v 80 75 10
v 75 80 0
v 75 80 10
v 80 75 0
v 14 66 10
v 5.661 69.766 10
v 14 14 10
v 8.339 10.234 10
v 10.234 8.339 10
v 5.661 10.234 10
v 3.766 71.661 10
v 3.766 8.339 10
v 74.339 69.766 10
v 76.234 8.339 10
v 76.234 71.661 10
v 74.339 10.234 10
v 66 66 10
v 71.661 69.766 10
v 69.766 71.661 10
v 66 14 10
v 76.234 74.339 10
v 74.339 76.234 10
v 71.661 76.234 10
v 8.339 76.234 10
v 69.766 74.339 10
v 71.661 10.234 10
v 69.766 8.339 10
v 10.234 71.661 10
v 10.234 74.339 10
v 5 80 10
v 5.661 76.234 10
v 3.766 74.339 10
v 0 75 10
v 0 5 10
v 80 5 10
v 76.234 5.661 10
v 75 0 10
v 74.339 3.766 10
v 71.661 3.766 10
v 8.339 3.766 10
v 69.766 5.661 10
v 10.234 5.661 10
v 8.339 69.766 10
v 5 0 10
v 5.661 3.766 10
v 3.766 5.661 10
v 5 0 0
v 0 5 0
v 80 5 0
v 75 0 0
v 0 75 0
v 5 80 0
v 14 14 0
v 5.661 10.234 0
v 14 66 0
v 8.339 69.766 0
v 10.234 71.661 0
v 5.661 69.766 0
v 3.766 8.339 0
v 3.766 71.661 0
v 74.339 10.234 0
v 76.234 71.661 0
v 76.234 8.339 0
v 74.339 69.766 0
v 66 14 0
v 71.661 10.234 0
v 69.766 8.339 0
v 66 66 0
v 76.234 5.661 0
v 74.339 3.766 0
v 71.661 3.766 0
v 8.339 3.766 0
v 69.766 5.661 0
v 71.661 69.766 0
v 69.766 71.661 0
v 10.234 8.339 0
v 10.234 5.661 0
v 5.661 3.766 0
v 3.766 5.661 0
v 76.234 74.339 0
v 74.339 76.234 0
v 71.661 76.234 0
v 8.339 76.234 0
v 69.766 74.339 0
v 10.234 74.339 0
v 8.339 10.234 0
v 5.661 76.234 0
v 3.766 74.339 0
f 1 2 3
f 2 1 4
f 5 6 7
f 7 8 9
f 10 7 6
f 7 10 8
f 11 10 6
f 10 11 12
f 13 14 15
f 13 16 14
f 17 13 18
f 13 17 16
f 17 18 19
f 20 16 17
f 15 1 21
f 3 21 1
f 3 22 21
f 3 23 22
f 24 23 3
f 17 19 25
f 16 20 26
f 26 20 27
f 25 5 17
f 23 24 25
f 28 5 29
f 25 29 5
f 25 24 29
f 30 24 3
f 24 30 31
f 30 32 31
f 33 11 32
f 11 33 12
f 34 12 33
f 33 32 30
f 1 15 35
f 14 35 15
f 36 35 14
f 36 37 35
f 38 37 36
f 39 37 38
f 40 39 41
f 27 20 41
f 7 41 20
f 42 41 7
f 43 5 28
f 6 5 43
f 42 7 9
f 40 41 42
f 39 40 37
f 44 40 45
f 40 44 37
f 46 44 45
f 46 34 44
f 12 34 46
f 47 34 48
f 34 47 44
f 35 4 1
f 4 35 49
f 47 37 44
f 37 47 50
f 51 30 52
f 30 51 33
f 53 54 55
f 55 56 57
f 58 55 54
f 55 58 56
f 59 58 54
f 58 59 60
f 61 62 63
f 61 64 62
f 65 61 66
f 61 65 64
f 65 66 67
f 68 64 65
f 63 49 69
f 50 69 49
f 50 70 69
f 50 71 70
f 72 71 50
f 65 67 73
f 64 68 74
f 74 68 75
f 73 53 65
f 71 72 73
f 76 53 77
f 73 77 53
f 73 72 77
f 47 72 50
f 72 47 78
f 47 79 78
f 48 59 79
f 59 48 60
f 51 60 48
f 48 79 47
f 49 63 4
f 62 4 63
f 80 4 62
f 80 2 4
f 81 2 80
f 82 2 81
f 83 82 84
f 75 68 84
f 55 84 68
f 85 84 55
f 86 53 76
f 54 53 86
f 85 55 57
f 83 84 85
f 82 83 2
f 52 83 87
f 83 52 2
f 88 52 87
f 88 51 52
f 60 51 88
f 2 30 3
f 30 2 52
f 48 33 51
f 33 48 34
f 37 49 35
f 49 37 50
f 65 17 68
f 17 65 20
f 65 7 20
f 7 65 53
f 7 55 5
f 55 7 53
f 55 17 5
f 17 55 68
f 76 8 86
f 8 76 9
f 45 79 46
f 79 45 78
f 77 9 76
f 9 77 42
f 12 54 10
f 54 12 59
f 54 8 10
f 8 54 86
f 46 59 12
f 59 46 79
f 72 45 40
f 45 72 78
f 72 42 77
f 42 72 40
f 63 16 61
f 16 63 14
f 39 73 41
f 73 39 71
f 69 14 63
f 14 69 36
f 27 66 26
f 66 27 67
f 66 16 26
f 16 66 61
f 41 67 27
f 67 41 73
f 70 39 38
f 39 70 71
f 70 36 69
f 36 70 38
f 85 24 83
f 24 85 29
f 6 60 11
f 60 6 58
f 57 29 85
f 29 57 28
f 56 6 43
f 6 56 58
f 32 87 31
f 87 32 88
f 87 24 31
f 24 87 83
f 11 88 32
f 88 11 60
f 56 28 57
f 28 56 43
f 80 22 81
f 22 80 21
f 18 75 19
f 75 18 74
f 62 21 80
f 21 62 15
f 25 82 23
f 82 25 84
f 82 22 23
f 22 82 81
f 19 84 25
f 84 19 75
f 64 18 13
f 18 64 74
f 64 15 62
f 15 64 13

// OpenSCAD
$fn = 32;

// ----------------------------------------------------------------------
// Frame plate: 80 x 80 frame, 14 mm rails
// ----------------------------------------------------------------------

// --- parameters (mm) ---
plate_l = 80;             // plate length, X
plate_w = 80;             // plate width, Y
plate_t = 10;             // plate thickness, Z (extrusion height)
corner_c = 5;             // corner chamfer
frame_bar = 14;           // frame rail width
bolt_r = 3.5;             // corner bolt window radius
bolt_inset = 7;           // bolt centre inset from the edges
fit_tol = 0.05;           // declared fit tolerance (prompt contract)
free_tol = 0.2;           // declared free tolerance (prompt contract)

win_l = plate_l - 2 * frame_bar;  // window length
win_w = plate_w - 2 * frame_bar;  // window width
bolt_d = 2 * bolt_r;  // corner hole diameter

profile = [[5, 0], [75, 0], [80, 5], [80, 75], [75, 80], [5, 80], [0, 75], [0, 5]];  // primary outline, 8 points, counter clockwise
void_1 = [[14, 14], [66, 14], [66, 66], [14, 66]];  // the window, 4 points
void_2 = [[10.234, 8.339], [8.339, 10.234], [5.661, 10.234], [3.766, 8.339], [3.766, 5.661], [5.661, 3.766], [8.339, 3.766], [10.234, 5.661]];  // corner bolt window, 8 points
void_3 = [[76.234, 8.339], [74.339, 10.234], [71.661, 10.234], [69.766, 8.339], [69.766, 5.661], [71.661, 3.766], [74.339, 3.766], [76.234, 5.661]];  // corner bolt window, 8 points
void_4 = [[10.234, 74.339], [8.339, 76.234], [5.661, 76.234], [3.766, 74.339], [3.766, 71.661], [5.661, 69.766], [8.339, 69.766], [10.234, 71.661]];  // corner bolt window, 8 points
void_5 = [[76.234, 74.339], [74.339, 76.234], [71.661, 76.234], [69.766, 74.339], [69.766, 71.661], [71.661, 69.766], [74.339, 69.766], [76.234, 71.661]];  // corner bolt window, 8 points

// --- the one profile operation ---
difference() {
  linear_extrude(height = plate_t) polygon(points = profile);
  translate([0, 0, -1])
    linear_extrude(height = plate_t + 2) polygon(points = void_1);
  translate([0, 0, -1])
    linear_extrude(height = plate_t + 2) polygon(points = void_2);
  translate([0, 0, -1])
    linear_extrude(height = plate_t + 2) polygon(points = void_3);
  translate([0, 0, -1])
    linear_extrude(height = plate_t + 2) polygon(points = void_4);
  translate([0, 0, -1])
    linear_extrude(height = plate_t + 2) polygon(points = void_5);
}
